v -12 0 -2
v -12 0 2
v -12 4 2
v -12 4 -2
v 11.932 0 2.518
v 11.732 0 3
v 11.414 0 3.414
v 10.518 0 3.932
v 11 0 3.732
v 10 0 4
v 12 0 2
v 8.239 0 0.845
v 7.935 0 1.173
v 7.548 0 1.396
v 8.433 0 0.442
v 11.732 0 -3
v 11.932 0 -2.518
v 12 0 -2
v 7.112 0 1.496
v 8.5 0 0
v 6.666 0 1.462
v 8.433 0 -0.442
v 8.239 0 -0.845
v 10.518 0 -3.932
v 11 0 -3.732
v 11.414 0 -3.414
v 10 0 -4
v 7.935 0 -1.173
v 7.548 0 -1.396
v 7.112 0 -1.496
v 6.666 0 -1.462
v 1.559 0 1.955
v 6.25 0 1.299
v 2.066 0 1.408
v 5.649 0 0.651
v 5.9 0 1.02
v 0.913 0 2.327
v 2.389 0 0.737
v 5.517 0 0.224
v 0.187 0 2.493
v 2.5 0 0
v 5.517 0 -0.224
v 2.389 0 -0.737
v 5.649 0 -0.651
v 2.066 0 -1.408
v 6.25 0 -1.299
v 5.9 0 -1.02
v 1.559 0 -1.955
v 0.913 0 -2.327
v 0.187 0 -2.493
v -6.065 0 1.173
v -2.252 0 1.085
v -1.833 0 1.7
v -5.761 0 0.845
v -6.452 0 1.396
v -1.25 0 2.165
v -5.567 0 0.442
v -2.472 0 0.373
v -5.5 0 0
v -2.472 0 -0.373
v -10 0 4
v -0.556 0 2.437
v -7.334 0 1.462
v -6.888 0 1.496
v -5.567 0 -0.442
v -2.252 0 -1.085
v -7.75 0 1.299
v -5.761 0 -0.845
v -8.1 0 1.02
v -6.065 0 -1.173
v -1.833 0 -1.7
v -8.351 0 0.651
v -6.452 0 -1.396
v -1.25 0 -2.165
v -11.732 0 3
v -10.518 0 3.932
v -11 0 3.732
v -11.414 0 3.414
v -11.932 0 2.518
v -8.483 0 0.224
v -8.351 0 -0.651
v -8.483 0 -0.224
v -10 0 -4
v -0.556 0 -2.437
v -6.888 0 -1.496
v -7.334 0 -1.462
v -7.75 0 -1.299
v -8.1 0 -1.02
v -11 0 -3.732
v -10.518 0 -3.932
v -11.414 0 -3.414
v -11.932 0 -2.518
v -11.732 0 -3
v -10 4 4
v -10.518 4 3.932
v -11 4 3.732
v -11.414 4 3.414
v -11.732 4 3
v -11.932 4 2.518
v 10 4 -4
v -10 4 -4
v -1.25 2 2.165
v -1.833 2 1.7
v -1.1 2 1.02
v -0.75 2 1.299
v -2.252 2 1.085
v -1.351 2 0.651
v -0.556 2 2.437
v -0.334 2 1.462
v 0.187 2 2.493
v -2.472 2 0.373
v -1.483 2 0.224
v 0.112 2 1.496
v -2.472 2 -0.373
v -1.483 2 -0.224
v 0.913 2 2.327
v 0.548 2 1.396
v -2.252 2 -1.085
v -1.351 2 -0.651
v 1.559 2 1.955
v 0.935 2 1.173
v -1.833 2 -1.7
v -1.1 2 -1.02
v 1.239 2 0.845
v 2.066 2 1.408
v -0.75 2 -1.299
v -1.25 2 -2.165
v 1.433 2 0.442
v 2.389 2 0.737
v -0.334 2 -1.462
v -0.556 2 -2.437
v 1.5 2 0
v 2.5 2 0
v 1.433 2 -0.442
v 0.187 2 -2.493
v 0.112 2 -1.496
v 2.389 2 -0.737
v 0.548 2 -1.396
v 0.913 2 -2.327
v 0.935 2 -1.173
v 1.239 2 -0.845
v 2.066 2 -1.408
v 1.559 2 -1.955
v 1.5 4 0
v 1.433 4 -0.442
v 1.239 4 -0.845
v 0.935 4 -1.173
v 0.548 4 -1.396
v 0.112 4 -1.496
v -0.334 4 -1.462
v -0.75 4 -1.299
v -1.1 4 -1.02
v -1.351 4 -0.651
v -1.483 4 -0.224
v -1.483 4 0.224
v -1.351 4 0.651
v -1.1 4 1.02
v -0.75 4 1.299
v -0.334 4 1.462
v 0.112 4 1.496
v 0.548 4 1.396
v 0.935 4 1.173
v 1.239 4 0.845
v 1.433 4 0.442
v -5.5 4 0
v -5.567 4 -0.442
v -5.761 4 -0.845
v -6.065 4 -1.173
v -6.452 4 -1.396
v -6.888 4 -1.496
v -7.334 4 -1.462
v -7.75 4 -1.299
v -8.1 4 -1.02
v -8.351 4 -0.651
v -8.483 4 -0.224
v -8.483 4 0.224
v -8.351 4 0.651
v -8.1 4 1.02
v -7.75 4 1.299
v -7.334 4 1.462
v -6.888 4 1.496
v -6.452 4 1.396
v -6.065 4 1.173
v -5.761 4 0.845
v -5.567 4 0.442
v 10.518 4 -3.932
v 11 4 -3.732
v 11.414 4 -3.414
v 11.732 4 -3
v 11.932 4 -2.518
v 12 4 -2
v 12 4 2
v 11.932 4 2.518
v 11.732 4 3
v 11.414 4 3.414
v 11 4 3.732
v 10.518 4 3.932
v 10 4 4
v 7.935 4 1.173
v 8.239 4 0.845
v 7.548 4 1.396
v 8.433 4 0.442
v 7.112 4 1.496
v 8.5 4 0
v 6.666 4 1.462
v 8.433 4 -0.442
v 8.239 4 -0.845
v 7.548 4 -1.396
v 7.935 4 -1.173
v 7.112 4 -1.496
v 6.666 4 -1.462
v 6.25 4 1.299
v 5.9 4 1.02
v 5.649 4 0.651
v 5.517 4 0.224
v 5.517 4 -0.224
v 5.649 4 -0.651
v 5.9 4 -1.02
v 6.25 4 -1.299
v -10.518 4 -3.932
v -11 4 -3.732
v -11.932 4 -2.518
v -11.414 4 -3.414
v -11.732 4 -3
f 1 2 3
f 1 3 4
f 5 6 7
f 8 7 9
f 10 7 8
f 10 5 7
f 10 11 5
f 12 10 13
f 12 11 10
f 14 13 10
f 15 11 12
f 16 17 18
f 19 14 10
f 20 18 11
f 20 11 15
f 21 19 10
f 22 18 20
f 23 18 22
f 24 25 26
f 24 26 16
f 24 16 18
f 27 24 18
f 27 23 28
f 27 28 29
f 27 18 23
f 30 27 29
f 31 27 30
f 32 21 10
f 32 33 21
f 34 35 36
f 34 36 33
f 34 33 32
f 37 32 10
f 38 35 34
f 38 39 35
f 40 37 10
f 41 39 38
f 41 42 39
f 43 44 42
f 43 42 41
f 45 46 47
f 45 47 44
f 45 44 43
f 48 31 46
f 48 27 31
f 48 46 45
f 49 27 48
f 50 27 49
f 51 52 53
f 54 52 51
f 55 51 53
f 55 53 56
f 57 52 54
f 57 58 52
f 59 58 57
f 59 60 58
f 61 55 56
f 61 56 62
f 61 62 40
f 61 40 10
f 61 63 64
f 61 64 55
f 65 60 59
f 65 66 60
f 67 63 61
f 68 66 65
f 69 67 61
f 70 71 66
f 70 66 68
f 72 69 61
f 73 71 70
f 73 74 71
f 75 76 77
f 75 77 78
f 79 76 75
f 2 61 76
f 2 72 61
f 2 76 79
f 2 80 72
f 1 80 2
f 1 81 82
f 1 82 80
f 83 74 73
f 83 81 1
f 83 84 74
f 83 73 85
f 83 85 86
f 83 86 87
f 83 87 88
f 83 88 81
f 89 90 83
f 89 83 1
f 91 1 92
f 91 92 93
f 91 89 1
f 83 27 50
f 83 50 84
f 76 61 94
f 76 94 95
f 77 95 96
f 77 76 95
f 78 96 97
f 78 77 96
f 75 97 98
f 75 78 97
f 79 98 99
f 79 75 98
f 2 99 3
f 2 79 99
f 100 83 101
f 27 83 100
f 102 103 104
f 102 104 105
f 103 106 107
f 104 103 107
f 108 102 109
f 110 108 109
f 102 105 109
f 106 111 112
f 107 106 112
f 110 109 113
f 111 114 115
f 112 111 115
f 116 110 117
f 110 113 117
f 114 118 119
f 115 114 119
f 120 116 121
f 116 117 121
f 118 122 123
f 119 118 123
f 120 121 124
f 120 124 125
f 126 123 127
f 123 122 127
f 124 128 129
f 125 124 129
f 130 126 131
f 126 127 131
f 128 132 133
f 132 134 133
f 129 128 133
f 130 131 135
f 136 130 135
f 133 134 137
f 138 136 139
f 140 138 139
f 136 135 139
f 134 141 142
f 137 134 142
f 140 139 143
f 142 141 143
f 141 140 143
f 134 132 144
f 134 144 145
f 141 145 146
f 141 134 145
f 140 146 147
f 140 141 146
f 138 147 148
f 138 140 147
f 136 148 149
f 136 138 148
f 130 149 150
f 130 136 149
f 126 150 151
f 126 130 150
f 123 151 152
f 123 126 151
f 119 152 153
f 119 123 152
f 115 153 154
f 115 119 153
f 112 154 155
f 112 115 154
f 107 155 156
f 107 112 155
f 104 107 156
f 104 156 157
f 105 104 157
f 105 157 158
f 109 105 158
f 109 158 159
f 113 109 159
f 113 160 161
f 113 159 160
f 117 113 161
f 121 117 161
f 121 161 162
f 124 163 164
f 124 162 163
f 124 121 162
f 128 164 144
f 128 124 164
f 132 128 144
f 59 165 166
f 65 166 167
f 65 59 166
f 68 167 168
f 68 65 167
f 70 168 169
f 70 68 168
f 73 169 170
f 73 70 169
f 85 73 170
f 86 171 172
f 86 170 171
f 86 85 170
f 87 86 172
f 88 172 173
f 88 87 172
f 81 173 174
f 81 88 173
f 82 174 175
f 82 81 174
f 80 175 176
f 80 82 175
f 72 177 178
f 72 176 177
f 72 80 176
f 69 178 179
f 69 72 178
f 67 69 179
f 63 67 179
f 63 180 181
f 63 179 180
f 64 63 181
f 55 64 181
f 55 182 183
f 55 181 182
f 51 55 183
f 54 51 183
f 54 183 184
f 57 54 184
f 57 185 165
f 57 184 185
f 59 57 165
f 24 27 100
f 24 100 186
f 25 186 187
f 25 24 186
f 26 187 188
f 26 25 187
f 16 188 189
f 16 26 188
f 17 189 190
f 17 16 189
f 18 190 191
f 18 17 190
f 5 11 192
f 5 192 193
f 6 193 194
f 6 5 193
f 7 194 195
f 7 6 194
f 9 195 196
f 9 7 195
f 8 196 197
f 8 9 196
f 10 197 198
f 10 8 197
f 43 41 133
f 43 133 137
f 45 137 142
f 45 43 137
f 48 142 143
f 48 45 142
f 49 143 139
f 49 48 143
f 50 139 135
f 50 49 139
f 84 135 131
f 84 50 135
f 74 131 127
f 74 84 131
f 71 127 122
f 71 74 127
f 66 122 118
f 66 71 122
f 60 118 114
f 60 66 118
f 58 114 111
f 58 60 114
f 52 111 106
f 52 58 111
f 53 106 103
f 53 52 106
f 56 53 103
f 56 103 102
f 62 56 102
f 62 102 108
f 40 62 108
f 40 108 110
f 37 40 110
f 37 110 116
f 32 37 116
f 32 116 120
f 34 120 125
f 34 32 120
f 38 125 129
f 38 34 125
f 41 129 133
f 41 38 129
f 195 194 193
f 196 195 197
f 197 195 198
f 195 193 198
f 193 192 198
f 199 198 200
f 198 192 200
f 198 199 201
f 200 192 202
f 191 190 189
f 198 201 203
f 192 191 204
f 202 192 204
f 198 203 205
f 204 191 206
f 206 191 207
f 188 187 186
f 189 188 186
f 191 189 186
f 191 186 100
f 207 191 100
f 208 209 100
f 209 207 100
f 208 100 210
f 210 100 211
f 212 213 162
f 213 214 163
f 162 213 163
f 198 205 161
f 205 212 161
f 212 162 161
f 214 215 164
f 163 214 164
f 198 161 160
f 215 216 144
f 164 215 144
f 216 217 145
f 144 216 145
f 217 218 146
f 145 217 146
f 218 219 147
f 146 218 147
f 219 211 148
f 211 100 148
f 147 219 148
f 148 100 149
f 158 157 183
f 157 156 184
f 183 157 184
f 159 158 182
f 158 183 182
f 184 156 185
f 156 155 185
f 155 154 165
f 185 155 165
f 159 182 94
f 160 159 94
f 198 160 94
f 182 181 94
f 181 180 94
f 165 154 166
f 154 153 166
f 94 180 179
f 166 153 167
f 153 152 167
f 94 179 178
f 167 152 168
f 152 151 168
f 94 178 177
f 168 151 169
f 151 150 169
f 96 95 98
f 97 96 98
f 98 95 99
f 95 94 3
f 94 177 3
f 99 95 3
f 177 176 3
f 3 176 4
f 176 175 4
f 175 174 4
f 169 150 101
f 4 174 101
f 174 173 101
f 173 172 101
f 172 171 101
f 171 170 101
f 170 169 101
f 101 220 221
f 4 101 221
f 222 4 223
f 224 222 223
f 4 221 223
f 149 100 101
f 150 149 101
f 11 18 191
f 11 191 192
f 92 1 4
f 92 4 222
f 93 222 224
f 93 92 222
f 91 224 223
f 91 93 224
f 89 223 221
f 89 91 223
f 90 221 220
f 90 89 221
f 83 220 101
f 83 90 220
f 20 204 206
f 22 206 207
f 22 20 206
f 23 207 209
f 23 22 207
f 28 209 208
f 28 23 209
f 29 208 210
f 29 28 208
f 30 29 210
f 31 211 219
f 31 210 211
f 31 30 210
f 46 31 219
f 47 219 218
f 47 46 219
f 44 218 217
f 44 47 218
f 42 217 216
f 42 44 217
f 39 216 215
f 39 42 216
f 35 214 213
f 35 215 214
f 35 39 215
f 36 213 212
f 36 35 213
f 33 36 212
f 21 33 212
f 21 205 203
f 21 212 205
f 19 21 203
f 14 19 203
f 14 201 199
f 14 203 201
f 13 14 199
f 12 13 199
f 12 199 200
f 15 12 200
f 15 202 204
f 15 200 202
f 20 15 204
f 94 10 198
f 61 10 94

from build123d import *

# Parameters (mm, degrees)
BOSS_EXTRUDE1_DEPTH = 4
CUT_EXTRUDE1_REACH  = 15.266
SKETCH1_3_R         = 1.5
SKETCH1_4_R         = 2.5
CUT_EXTRUDE2_DEPTH  = 2


with BuildPart() as part:
    # Sketch1 → Boss-Extrude1 (new body)
    with BuildSketch(Plane(origin=(0, 0, 0), x_dir=(1, 0, 0), z_dir=(0, 1, 0))):
        with BuildLine():
            Line((0, 4), (10, 4))
            ThreePointArc((10, 4), (11.414213562, 3.414213562), (12, 2))
            Line((12, 2), (12, -2))
            ThreePointArc((12, -2), (11.414213562, -3.414213562), (10, -4))
            Line((10, -4), (0, -4))
            Line((0, -4), (-10, -4))
            ThreePointArc((-10, -4), (-11.414213562, -3.414213562), (-12, -2))
            Line((-12, -2), (-12, 2))
            ThreePointArc((-12, 2), (-11.414213562, 3.414213562), (-10, 4))
            Line((-10, 4), (0, 4))
        make_face()
    extrude(amount=BOSS_EXTRUDE1_DEPTH)

    # Sketch1<3> → Cut-Extrude1 (cut, up to next)
    with BuildSketch(Plane(origin=(0, 0, 0), x_dir=(1, 0, 0), z_dir=(0, 1, 0)), mode=Mode.PRIVATE) as cut_extrude1_sk1:
        Circle(SKETCH1_3_R)
    cut_extrude1_tool1 = extrude(cut_extrude1_sk1.sketch, amount=CUT_EXTRUDE1_REACH, mode=Mode.PRIVATE) & part.part
    # Sketch1<3> → Cut-Extrude1 (cut, up to next)
    with BuildSketch(Plane(origin=(0, 0, 0), x_dir=(1, 0, 0), z_dir=(0, 1, 0)), mode=Mode.PRIVATE) as cut_extrude1_sk2:
        with Locations((-7, 0)):
            Circle(SKETCH1_3_R)
    cut_extrude1_tool2 = extrude(cut_extrude1_sk2.sketch, amount=CUT_EXTRUDE1_REACH, mode=Mode.PRIVATE) & part.part
    # Sketch1<3> → Cut-Extrude1 (cut, up to next)
    with BuildSketch(Plane(origin=(0, 0, 0), x_dir=(1, 0, 0), z_dir=(0, 1, 0)), mode=Mode.PRIVATE) as cut_extrude1_sk3:
        with Locations((7, 0)):
            Circle(SKETCH1_3_R)
    cut_extrude1_tool3 = extrude(cut_extrude1_sk3.sketch, amount=CUT_EXTRUDE1_REACH, mode=Mode.PRIVATE) & part.part
    add(cut_extrude1_tool1.solids().sort_by_distance((0, 0, 0))[0], mode=Mode.SUBTRACT)
    add(cut_extrude1_tool2.solids().sort_by_distance((-7, 0, 0))[0], mode=Mode.SUBTRACT)
    add(cut_extrude1_tool3.solids().sort_by_distance((7, 0, 0))[0], mode=Mode.SUBTRACT)

    # Sketch1<4> → Cut-Extrude2 (cut)
    with BuildSketch(Plane(origin=(0, 0, 0), x_dir=(1, 0, 0), z_dir=(0, 1, 0))):
        Circle(SKETCH1_4_R)
    extrude(amount=CUT_EXTRUDE2_DEPTH, mode=Mode.SUBTRACT)


solid = part.part
